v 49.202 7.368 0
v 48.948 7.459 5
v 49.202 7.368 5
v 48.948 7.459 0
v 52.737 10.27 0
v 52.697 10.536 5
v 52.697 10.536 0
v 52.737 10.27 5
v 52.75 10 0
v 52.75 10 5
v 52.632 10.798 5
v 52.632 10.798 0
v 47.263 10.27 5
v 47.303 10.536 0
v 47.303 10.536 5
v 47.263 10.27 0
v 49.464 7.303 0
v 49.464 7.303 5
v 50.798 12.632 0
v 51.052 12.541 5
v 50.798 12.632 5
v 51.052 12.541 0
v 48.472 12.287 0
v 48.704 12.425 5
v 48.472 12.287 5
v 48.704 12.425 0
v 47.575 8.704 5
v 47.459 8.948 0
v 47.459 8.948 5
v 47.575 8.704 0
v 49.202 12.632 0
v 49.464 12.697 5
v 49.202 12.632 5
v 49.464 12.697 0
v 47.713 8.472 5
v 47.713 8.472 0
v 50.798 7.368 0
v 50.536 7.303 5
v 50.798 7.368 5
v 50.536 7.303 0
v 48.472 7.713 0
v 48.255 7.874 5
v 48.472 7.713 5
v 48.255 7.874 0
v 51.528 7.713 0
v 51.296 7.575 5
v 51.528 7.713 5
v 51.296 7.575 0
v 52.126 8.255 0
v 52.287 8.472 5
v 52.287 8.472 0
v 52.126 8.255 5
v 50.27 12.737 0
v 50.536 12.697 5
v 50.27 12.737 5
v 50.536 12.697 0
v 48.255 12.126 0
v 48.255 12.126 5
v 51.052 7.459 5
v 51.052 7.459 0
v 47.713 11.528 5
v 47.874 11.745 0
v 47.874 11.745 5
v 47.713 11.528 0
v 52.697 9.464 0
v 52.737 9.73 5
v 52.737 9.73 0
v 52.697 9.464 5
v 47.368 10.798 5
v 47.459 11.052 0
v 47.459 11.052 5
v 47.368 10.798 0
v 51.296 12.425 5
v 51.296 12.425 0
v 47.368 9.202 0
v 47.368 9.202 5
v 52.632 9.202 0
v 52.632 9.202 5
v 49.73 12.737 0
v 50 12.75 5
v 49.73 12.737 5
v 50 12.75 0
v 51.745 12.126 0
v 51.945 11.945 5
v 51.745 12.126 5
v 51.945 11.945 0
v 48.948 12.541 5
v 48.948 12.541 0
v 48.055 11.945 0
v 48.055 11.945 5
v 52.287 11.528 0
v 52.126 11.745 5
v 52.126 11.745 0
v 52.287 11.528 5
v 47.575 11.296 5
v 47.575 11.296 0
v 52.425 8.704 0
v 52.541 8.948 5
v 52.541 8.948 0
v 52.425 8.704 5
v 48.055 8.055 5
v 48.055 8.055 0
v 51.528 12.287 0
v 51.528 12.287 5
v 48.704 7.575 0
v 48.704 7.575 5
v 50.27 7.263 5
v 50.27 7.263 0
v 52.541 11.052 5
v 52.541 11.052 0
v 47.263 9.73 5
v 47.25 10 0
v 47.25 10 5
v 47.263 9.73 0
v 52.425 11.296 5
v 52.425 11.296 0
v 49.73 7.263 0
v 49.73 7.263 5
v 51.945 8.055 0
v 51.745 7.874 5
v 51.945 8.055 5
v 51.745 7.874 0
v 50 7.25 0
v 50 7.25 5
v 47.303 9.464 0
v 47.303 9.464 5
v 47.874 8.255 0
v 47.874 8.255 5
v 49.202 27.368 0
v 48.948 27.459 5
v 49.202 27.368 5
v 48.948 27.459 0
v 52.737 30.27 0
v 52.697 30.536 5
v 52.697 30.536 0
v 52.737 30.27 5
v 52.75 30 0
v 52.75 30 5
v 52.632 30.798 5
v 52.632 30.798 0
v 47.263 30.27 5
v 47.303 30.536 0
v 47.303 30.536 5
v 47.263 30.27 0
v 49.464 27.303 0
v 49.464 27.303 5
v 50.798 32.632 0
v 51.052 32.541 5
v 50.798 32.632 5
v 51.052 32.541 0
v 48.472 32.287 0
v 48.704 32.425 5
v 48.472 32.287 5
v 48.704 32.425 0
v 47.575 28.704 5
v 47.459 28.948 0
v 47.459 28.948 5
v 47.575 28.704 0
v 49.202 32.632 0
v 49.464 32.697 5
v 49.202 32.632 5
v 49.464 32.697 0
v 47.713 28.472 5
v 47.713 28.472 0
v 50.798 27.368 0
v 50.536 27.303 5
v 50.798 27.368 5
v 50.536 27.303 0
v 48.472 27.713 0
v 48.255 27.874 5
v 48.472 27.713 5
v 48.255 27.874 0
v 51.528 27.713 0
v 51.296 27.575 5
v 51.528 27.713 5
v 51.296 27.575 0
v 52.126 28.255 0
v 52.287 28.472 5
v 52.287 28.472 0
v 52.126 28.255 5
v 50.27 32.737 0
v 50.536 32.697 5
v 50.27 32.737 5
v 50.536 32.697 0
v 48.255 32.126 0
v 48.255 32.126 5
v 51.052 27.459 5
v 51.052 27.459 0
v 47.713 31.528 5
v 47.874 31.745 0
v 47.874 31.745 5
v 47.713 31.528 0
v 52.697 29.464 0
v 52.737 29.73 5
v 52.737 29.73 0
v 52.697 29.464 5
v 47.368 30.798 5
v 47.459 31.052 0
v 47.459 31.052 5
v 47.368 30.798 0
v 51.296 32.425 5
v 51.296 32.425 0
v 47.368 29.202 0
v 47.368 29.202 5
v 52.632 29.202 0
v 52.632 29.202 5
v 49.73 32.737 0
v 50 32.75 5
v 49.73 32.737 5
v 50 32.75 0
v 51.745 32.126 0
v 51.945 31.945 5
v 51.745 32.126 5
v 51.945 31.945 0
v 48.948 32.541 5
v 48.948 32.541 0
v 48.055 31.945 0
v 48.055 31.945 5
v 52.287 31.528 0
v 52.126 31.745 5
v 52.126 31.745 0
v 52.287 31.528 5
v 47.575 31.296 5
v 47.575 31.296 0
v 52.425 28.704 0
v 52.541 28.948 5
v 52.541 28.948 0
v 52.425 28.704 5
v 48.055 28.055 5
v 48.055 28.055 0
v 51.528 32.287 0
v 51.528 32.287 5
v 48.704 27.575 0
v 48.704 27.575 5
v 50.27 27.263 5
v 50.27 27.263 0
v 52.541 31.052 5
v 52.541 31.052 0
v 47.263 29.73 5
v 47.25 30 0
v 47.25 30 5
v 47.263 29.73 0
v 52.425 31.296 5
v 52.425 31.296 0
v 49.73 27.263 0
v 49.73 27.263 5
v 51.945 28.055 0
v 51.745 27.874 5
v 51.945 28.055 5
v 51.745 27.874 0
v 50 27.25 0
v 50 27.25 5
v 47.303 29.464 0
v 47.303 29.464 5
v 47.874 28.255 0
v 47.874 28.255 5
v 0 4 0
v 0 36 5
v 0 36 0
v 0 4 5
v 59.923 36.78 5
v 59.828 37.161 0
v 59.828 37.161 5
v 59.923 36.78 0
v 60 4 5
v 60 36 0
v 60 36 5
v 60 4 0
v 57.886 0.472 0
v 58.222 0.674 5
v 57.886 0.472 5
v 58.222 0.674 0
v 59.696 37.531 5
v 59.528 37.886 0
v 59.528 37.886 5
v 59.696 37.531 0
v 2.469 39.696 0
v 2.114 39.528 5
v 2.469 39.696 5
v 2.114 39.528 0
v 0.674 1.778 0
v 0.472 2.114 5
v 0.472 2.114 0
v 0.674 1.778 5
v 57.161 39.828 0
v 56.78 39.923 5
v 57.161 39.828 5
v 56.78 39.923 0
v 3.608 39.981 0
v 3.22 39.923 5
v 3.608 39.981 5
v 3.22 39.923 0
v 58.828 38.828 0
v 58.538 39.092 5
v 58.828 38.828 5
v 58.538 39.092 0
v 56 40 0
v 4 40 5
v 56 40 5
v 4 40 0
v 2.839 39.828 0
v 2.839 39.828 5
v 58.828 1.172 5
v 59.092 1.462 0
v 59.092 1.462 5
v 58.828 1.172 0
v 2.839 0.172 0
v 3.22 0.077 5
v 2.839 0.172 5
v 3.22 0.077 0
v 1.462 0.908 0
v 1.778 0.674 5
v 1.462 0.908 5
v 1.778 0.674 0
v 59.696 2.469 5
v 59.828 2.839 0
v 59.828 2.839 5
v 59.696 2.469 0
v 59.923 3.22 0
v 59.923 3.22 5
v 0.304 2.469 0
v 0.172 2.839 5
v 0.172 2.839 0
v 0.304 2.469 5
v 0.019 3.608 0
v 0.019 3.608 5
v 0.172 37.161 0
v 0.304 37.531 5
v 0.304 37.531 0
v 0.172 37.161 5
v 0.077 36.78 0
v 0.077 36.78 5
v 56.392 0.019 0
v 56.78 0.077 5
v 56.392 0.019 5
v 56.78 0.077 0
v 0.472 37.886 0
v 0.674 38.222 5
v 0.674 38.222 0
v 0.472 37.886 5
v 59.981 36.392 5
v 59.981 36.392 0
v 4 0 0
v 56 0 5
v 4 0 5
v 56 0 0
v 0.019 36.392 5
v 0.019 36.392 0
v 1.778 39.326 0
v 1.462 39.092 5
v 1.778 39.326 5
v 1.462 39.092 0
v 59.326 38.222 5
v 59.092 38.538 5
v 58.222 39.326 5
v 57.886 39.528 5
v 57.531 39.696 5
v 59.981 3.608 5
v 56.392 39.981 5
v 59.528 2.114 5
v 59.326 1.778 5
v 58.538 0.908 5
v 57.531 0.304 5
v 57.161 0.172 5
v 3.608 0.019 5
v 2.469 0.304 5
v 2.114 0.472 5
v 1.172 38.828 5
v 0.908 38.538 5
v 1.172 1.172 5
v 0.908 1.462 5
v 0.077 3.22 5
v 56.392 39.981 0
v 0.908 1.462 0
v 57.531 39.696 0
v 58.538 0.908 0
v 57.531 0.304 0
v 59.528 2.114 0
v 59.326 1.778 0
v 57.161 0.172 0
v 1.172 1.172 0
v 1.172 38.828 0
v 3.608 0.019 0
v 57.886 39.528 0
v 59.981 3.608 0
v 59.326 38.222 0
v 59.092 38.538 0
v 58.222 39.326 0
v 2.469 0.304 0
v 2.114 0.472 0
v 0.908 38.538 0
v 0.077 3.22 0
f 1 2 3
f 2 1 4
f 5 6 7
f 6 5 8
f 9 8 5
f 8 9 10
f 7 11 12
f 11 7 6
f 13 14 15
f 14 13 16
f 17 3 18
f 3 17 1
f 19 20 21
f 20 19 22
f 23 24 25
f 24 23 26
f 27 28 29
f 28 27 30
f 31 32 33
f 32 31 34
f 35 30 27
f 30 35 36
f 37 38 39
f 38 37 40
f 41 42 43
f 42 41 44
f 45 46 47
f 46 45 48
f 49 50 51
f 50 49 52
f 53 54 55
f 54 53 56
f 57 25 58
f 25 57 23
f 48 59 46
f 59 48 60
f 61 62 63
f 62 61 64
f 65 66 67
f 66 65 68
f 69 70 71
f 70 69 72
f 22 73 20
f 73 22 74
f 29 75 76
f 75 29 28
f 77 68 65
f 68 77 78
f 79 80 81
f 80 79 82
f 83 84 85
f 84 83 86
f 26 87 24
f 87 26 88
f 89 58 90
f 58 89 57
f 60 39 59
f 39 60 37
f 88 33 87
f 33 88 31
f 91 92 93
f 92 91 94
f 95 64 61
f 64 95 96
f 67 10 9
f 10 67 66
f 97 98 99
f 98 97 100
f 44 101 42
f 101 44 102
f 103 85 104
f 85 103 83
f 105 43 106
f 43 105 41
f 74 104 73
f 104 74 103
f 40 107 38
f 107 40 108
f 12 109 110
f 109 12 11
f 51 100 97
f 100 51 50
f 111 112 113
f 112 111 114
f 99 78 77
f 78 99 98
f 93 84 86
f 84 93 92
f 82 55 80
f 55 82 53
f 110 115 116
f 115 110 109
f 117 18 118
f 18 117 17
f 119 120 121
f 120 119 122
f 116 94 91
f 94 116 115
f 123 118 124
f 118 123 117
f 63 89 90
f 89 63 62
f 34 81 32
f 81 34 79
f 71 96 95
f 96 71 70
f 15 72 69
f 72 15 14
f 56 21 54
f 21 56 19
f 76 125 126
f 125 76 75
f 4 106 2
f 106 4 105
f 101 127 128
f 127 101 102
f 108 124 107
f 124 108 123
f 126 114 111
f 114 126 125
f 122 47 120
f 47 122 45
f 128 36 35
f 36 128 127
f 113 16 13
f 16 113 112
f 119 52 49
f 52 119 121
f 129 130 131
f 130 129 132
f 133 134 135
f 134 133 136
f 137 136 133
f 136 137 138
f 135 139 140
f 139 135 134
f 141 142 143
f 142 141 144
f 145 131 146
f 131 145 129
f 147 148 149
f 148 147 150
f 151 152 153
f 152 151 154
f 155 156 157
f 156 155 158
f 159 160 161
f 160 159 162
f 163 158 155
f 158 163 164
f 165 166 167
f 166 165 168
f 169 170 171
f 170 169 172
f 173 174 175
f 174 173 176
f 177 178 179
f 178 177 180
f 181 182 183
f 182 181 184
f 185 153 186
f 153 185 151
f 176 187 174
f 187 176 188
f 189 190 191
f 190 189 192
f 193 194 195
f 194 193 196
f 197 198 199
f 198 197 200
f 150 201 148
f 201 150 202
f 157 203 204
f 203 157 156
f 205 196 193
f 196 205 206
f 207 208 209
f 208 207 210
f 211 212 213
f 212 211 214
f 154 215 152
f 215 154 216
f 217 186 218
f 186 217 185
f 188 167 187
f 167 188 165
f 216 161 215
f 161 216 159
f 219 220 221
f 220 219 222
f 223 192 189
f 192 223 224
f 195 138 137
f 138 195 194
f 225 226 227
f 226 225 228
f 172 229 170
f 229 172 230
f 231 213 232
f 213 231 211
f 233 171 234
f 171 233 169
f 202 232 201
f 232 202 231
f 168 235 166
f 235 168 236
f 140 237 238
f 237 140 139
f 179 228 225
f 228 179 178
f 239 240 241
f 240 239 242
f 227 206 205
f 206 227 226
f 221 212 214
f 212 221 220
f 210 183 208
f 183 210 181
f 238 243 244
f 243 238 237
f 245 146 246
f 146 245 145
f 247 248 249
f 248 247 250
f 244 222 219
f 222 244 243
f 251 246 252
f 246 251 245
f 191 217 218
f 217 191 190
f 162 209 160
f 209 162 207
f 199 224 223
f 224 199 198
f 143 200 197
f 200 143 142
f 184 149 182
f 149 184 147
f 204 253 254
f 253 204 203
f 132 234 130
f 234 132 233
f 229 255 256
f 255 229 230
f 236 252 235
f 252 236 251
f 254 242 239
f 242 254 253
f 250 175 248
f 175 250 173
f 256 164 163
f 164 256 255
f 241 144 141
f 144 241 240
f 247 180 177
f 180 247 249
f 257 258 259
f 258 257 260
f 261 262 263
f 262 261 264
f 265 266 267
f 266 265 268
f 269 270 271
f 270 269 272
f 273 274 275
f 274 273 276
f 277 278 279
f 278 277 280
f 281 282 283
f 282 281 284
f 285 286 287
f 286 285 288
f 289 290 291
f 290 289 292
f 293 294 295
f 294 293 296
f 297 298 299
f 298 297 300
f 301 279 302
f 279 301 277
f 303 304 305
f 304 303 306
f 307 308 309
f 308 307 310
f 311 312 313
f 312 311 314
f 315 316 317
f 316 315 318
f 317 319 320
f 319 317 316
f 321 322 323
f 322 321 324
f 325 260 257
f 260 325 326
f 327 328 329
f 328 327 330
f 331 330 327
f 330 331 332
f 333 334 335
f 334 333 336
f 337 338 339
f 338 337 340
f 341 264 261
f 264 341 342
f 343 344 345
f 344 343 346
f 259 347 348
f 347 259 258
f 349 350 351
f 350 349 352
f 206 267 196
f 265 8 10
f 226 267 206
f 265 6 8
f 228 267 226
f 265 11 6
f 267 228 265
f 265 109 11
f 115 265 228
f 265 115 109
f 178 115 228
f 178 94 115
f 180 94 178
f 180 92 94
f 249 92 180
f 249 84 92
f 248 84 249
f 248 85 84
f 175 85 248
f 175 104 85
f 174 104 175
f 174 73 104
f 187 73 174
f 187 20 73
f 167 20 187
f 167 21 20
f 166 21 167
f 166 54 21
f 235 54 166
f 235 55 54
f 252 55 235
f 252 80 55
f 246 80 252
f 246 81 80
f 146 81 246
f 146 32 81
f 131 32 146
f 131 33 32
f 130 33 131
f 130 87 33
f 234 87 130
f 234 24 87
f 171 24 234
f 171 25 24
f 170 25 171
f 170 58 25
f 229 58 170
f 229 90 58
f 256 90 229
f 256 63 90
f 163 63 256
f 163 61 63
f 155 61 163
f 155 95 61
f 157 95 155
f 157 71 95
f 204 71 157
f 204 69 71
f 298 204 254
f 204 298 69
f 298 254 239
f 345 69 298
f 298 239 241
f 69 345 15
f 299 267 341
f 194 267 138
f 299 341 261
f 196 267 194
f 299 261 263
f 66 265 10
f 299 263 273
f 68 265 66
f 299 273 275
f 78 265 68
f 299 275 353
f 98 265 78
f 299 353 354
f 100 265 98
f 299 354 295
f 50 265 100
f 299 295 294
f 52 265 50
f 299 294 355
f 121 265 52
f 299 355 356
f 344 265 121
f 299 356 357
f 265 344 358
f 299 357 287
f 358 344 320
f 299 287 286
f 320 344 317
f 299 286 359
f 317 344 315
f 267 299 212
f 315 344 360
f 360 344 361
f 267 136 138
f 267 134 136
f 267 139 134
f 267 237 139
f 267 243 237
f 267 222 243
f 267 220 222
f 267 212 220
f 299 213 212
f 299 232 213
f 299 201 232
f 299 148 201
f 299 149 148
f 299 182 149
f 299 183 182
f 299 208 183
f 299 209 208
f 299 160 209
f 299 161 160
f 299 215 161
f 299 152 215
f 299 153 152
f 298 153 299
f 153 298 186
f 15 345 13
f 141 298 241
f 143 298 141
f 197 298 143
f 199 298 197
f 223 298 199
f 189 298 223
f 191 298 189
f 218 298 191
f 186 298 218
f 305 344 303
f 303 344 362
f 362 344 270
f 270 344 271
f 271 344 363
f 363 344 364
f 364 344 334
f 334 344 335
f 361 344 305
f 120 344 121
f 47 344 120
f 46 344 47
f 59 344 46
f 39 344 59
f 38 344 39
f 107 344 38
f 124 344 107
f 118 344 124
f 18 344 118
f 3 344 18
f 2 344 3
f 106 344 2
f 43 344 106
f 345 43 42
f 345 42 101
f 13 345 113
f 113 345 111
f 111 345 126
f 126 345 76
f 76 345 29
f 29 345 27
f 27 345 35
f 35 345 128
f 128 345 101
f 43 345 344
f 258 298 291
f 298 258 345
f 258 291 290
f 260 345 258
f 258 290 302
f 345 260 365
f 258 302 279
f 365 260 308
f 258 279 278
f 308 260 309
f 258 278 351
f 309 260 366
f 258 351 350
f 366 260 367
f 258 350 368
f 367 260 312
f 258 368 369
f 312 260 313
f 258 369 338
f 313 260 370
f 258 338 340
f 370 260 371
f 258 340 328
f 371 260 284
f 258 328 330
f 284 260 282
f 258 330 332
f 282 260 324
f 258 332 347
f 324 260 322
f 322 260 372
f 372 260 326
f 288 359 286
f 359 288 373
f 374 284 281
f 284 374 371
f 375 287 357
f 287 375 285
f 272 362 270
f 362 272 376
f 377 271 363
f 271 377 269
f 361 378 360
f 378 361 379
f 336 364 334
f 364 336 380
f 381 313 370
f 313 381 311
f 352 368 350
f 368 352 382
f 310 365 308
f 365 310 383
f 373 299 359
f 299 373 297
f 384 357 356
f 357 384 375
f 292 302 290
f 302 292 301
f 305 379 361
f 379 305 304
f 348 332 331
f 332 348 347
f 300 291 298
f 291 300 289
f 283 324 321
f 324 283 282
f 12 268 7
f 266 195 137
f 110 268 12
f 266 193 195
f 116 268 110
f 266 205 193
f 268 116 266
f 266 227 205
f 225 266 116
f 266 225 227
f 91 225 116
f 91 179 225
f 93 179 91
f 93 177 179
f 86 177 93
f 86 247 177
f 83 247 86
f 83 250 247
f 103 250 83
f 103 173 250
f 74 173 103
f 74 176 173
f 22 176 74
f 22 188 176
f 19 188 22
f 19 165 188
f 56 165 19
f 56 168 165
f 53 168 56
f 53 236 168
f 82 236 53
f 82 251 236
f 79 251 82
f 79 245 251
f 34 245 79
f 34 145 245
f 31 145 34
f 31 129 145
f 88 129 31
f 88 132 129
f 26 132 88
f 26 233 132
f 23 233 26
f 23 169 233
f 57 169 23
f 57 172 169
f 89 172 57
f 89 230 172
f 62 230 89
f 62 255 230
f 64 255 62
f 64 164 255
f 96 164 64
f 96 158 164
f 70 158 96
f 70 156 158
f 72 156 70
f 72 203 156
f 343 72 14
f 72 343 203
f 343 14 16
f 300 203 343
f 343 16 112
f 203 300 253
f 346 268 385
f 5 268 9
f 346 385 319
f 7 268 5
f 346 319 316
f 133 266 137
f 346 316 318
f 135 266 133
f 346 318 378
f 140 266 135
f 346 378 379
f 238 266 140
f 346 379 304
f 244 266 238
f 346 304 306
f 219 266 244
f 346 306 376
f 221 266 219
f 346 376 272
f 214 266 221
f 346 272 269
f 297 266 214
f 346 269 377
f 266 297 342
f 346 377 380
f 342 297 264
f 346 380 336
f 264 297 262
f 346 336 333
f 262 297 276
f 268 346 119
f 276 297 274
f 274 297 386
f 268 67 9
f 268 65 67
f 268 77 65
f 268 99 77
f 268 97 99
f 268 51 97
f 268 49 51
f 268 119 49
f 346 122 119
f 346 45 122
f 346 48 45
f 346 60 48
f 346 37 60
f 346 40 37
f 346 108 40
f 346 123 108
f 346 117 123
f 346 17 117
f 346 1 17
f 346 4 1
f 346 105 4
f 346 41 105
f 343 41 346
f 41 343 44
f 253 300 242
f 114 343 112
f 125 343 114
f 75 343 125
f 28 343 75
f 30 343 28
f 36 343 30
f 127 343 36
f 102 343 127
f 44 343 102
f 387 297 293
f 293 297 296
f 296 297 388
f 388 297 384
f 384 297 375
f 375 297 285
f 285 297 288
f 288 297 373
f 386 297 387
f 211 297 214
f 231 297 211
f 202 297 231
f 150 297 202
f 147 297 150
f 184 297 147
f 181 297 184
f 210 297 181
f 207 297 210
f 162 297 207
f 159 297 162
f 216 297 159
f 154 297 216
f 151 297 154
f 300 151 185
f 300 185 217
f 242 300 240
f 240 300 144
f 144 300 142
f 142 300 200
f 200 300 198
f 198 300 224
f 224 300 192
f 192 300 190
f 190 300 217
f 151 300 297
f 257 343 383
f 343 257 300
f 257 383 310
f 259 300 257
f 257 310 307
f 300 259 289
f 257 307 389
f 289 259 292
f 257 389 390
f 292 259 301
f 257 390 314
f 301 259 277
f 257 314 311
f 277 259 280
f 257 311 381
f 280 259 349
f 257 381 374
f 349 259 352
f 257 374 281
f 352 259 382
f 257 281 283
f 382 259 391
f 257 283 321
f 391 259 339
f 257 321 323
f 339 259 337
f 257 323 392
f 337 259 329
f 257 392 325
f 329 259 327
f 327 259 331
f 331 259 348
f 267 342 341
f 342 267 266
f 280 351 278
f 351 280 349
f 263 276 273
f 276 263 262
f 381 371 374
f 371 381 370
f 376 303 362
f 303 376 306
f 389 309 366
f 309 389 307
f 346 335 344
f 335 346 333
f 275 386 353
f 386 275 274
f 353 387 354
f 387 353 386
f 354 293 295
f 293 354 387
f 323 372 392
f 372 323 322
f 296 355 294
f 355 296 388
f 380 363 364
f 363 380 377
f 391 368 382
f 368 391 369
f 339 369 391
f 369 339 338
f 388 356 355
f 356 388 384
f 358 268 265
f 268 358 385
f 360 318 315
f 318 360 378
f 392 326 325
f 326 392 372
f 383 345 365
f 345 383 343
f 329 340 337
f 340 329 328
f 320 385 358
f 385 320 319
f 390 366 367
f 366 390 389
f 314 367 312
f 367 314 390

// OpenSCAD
// The same idea in OpenSCAD's own language, for when a part is simple enough
// that a DSL beats Python — and so you can open and remix the enormous body of
// existing .scad designs.
//
//   openscad part.scad                  GUI; enable Design → Automatic Reload and Preview
//   openscad -o build/part.stl part.scad   headless export
//
// OpenSCAD is mesh/CSG: it exports STL/3MF/OFF, but not STEP. Use model.py when
// you need a B-rep for CNC, or true fillets.

/* [Plate] */
length = 60;   // [20:120]
width  = 40;   // [20:120]
thick  = 5;    // [2:20]
corner = 4;    // [0:10]

/* [Holes] */
hole_d = 5.5;
inset  = 10;

$fn = 64;

module rounded_plate(l, w, t, r) {
    hull()
        for (x = [r, l - r], y = [r, w - r])
            translate([x, y, 0]) cylinder(h = t, r = r);
}

difference() {
    rounded_plate(length, width, thick, corner);
    for (y = [width / 4, 3 * width / 4])
        translate([length - inset, y, -1])
            cylinder(h = thick + 2, d = hole_d);
}
